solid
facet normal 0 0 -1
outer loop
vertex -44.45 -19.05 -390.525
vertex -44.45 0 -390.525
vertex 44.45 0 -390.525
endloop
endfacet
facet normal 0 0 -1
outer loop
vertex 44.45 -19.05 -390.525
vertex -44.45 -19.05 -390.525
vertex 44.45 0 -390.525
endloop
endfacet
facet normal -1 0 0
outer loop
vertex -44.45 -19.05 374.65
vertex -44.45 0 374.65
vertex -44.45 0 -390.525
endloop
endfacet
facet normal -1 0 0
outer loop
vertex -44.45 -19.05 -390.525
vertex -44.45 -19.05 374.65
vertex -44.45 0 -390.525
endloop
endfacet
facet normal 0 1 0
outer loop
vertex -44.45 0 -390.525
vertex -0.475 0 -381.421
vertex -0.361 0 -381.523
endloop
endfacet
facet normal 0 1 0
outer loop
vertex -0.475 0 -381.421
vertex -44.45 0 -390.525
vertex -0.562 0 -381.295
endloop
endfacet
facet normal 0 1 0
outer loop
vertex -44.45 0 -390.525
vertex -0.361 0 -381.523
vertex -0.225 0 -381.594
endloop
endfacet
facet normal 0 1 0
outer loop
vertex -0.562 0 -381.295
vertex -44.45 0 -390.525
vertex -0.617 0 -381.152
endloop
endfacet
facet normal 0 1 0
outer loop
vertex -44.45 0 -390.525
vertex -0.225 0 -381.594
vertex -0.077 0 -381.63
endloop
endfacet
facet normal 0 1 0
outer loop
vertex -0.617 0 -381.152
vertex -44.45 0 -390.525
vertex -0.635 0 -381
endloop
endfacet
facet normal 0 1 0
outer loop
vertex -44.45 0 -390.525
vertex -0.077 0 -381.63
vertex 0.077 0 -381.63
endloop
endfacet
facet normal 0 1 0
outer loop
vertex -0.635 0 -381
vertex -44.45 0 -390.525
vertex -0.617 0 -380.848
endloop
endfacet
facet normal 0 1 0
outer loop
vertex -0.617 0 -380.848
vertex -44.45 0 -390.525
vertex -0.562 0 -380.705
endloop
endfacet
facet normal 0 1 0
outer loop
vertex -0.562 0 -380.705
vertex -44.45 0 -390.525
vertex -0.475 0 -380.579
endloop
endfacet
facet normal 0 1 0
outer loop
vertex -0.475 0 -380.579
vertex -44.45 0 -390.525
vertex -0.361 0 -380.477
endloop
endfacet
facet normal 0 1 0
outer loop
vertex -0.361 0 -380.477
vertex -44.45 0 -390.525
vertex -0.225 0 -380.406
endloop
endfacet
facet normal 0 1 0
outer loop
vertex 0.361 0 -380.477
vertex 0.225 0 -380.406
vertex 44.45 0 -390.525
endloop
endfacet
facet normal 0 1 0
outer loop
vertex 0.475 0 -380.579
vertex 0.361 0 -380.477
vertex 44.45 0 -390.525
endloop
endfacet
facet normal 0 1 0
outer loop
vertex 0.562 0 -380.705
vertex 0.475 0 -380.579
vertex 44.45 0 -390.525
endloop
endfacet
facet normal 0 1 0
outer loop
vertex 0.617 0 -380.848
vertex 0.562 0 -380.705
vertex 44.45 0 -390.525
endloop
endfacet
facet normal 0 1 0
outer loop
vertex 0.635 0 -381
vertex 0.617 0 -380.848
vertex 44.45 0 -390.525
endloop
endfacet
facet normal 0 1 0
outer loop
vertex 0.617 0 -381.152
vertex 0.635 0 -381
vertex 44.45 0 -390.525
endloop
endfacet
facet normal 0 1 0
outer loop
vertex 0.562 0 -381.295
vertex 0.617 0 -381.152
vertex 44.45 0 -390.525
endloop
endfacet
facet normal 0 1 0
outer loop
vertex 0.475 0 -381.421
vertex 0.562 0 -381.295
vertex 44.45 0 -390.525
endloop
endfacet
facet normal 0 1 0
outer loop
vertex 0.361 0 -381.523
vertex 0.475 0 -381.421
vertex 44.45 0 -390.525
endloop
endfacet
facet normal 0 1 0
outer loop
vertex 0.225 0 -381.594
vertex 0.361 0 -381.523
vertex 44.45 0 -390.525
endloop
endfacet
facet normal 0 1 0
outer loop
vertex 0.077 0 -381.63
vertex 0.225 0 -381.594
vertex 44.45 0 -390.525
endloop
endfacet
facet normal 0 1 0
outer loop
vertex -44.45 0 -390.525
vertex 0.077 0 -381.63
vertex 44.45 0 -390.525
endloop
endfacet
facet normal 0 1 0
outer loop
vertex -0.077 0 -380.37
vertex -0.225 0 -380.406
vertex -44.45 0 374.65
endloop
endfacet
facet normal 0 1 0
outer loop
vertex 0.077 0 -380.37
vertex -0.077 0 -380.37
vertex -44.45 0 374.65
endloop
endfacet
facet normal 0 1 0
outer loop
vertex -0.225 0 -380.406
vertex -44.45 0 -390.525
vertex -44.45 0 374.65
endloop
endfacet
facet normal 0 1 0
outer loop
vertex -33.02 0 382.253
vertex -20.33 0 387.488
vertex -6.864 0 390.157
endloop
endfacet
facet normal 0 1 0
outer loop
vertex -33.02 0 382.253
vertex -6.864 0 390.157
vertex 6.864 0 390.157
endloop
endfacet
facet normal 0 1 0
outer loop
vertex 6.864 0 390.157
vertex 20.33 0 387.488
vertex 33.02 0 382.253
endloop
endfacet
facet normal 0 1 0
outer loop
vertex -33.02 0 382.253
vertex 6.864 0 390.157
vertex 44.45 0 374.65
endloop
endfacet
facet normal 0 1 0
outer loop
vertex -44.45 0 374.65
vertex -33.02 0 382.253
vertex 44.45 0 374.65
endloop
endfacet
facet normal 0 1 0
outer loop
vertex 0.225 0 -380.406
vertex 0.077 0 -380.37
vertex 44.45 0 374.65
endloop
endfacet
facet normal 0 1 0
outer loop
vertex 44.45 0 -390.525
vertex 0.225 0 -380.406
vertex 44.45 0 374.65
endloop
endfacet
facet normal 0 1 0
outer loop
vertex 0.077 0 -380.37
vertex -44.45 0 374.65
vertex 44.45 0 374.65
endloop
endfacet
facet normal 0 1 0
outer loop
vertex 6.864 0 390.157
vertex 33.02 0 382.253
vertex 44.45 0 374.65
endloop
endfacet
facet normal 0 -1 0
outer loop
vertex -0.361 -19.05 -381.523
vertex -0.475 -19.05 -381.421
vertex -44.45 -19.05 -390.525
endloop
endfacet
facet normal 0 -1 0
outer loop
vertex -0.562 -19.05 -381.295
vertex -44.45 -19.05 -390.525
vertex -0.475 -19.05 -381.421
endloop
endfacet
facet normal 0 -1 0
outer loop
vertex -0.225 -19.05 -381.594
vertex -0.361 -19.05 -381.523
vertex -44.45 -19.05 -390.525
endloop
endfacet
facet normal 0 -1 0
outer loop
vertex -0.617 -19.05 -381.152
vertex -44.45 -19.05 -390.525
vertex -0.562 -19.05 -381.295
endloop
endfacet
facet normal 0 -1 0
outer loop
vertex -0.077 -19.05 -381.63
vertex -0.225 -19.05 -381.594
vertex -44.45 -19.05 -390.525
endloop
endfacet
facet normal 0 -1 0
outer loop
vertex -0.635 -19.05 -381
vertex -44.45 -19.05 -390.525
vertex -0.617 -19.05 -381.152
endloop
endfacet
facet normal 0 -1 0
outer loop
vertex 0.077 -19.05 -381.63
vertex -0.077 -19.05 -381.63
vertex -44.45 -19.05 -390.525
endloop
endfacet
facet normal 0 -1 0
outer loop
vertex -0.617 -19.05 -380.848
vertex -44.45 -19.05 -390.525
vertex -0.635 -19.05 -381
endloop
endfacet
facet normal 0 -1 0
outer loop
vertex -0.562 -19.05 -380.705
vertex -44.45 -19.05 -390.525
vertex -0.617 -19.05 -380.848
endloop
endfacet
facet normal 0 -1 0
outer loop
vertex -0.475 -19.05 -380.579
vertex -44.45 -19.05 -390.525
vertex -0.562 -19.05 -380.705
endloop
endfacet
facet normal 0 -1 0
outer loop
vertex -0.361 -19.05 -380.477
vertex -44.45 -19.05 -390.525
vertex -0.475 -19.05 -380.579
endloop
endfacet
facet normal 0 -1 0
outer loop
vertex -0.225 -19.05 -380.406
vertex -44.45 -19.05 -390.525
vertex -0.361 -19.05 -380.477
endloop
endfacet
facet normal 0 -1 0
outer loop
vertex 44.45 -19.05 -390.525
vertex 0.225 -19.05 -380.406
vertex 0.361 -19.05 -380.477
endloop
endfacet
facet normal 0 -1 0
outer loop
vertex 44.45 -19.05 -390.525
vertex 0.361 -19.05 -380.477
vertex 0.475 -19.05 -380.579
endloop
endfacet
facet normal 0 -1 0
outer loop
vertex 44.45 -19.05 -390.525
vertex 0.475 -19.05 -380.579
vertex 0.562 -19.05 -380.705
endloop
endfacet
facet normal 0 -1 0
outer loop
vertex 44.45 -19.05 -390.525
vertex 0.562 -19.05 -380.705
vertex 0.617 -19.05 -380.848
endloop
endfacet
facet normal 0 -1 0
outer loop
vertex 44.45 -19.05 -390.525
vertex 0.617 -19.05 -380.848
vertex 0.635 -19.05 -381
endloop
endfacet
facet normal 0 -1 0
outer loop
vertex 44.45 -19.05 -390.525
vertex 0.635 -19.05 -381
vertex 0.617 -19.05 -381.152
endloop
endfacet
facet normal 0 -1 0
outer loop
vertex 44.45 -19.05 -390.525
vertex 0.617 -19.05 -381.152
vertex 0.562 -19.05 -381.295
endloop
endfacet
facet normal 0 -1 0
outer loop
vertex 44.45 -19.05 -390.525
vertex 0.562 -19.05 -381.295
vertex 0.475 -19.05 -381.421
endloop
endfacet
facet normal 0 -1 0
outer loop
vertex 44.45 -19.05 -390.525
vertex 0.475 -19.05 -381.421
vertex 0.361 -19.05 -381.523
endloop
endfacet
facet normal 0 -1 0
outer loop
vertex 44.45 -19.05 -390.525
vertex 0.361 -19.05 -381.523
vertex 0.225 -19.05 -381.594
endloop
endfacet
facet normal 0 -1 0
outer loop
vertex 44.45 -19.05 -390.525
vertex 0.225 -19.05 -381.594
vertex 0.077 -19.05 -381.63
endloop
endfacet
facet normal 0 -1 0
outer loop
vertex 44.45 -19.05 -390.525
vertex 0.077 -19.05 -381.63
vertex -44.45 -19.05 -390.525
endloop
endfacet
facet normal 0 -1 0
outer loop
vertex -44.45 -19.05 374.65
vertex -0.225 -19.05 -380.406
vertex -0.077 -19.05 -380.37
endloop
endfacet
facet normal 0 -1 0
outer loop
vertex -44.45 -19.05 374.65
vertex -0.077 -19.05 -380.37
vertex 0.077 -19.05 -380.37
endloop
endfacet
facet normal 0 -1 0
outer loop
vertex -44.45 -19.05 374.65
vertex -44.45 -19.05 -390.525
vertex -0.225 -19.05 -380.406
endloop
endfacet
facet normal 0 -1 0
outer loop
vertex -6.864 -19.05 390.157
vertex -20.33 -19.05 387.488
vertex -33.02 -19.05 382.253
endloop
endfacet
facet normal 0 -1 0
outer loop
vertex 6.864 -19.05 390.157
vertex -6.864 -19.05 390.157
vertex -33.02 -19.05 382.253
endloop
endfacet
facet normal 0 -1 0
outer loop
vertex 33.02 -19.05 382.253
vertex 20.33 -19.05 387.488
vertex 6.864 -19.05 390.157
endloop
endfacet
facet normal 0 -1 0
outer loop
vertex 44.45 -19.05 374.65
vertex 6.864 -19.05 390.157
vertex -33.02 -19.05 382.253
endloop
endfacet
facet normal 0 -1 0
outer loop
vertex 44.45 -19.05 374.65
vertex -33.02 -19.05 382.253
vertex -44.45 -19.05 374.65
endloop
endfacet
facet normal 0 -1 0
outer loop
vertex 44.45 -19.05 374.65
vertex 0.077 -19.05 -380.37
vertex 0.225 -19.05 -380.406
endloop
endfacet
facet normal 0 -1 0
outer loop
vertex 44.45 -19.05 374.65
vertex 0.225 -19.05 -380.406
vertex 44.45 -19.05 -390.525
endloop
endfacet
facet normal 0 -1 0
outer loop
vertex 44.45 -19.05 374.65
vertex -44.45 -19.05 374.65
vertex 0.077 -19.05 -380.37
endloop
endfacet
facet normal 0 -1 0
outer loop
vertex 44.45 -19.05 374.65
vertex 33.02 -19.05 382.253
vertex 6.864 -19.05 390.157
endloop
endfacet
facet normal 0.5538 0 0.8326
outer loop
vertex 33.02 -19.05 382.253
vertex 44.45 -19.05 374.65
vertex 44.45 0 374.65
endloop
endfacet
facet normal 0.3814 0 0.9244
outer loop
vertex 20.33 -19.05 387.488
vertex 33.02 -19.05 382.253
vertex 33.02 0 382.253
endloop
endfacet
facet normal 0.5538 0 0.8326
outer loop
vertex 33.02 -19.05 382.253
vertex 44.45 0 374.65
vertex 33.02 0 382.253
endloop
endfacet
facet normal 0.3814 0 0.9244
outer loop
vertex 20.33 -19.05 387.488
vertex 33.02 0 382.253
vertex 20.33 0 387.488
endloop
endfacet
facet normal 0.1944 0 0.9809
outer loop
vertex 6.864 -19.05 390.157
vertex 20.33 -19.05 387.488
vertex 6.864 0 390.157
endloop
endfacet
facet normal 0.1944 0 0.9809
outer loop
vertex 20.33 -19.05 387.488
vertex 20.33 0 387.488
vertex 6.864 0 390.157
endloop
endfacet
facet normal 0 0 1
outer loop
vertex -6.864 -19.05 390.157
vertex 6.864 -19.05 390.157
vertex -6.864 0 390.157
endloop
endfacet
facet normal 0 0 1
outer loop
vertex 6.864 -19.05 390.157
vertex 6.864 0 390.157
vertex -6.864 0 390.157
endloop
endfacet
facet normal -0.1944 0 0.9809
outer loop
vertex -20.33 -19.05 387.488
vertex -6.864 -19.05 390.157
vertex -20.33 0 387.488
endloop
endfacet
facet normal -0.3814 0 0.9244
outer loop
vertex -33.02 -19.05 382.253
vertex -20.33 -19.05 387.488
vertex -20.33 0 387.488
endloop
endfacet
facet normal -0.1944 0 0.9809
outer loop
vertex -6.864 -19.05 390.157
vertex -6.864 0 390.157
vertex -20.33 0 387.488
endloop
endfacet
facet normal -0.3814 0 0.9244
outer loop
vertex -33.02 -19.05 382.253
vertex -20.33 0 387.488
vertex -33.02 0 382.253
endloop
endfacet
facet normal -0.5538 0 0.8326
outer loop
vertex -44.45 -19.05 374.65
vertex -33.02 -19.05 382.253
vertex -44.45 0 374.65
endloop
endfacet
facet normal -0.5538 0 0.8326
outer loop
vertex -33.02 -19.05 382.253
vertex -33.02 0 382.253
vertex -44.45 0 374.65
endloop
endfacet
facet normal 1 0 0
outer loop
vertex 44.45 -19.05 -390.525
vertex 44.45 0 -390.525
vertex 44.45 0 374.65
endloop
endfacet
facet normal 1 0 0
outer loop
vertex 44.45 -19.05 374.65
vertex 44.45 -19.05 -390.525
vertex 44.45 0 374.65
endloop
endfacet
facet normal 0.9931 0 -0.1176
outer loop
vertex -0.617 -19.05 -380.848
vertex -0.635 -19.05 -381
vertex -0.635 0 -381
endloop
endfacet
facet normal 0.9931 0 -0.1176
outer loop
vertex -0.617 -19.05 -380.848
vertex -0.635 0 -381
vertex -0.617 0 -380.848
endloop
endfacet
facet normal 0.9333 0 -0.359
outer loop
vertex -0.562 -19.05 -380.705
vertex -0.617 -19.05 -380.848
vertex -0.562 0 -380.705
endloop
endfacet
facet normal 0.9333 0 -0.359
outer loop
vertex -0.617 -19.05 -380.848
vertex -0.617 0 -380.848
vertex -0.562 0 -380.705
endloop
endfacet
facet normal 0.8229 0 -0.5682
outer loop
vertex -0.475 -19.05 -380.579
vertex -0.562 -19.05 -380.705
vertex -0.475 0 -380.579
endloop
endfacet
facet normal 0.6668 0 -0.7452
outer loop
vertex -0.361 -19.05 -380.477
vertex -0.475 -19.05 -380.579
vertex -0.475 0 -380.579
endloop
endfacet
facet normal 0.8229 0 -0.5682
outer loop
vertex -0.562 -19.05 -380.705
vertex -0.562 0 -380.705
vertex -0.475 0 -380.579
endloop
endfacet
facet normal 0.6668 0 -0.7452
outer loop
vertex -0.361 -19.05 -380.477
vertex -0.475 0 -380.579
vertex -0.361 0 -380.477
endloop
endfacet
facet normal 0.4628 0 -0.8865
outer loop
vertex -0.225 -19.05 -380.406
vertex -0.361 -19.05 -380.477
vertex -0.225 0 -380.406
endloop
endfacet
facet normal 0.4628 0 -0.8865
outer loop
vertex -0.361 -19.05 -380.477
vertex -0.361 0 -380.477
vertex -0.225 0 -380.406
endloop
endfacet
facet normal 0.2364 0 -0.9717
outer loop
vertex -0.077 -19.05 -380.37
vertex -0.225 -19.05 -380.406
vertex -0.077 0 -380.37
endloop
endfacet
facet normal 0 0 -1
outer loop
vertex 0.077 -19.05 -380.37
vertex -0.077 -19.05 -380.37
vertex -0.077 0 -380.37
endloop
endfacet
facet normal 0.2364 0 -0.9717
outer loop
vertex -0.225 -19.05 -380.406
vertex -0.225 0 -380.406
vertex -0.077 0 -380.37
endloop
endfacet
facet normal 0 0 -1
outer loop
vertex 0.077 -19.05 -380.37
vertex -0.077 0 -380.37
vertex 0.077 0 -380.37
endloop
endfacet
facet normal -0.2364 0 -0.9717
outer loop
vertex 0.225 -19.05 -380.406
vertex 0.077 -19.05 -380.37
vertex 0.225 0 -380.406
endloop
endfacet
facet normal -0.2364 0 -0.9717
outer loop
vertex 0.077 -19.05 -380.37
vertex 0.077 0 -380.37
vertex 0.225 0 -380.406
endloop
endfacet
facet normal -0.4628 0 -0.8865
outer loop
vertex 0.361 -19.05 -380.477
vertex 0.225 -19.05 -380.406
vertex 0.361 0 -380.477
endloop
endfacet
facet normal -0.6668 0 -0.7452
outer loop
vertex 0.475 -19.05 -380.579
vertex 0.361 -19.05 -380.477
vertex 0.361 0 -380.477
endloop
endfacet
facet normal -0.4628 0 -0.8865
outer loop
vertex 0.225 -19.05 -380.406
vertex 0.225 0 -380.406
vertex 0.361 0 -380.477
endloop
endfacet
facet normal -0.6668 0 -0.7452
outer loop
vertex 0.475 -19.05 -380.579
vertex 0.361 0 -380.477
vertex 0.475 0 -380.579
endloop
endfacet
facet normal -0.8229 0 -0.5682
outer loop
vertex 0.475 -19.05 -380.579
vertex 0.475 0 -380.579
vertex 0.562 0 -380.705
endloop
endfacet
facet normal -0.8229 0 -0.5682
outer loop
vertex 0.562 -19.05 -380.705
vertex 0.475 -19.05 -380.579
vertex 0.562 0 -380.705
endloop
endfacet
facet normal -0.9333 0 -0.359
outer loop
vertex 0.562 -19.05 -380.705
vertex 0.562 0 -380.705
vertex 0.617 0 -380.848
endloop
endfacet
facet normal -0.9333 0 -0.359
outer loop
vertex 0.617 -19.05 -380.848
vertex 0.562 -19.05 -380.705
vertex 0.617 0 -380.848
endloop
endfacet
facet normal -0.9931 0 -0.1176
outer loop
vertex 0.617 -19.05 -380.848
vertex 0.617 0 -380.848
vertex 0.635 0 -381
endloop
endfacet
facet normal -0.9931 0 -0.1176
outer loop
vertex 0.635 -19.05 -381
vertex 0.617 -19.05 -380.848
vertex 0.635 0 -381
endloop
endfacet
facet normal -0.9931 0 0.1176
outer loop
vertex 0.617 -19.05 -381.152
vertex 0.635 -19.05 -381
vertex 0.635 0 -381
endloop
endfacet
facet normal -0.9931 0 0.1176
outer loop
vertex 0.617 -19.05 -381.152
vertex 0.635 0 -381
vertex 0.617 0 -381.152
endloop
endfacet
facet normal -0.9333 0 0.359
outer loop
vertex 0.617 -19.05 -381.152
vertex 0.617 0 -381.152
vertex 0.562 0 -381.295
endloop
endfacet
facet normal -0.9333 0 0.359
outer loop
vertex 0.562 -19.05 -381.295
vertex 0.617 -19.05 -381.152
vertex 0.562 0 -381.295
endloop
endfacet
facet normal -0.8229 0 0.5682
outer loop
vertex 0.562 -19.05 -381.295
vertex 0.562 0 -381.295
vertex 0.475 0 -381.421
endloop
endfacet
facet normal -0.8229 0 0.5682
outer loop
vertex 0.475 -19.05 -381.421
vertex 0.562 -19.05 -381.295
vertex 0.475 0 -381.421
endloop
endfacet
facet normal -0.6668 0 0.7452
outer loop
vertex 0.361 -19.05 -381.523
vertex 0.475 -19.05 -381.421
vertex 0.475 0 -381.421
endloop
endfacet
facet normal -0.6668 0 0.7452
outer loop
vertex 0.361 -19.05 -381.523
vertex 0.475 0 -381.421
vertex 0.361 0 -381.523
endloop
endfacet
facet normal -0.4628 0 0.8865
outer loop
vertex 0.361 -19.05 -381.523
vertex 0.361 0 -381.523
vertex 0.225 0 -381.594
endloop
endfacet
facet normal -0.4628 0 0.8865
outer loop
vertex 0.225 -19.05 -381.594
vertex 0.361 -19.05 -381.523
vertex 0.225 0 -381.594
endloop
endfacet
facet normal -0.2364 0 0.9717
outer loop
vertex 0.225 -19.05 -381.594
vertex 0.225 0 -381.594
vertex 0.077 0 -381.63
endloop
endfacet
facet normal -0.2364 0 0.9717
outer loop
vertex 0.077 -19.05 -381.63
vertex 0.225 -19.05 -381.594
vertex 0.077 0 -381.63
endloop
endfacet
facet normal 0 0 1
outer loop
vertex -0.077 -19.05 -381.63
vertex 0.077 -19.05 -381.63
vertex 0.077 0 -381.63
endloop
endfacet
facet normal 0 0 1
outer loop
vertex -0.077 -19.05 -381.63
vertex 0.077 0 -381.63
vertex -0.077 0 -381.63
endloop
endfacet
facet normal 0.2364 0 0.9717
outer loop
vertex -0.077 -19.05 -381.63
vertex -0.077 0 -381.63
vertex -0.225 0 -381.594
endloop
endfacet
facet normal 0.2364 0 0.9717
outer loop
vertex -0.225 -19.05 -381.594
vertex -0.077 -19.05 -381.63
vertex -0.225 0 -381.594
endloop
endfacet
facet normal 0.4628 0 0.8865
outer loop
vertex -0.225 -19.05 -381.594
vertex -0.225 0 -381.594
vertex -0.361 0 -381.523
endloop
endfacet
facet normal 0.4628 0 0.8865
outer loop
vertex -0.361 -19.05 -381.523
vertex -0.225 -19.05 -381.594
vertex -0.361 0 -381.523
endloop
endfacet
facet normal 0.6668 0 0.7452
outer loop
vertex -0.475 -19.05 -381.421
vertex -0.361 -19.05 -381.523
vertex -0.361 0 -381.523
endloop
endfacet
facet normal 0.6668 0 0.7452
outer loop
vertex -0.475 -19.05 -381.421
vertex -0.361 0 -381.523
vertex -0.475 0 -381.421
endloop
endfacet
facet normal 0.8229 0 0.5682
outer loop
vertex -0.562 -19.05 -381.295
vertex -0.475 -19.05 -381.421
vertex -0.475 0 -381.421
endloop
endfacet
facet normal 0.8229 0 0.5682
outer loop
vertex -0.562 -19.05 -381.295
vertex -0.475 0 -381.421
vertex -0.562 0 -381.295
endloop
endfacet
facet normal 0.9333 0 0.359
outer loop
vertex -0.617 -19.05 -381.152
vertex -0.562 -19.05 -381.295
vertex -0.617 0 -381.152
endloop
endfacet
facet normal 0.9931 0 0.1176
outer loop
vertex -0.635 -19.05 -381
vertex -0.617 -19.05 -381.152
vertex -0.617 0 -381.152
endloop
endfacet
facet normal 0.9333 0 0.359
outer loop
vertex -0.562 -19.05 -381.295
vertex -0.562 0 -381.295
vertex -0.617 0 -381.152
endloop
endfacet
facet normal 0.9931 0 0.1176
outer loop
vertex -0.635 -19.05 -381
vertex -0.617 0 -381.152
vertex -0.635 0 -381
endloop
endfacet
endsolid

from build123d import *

# Parameters (mm, degrees)
F1_DEPTH = 19.05
F2_R     = 0.635
F3_DEPTH = 19.051


with BuildPart() as f1:
    # F0 (on Front) → F1 (new body)
    with BuildSketch(Plane.XZ):
        with BuildLine():
            Line((-44.45, 374.65), (-44.45, -390.525))
            Line((-44.45, -390.525), (44.45, -390.525))
            Line((44.45, -390.525), (44.45, 374.65))
            ThreePointArc((44.45, 374.65), (0, 390.493247), (-44.45, 374.65))
        make_face()
    extrude(amount=F1_DEPTH)

    # F2 (on face) → F3 (cut, through all)
    with BuildSketch(Plane(origin=(0, 0, 0), x_dir=(-1, 0, 0), z_dir=(0, 1, 0))):
        with Locations((0, -381)):
            Circle(F2_R)
    extrude(amount=-F3_DEPTH, mode=Mode.SUBTRACT)


solid = f1.part
